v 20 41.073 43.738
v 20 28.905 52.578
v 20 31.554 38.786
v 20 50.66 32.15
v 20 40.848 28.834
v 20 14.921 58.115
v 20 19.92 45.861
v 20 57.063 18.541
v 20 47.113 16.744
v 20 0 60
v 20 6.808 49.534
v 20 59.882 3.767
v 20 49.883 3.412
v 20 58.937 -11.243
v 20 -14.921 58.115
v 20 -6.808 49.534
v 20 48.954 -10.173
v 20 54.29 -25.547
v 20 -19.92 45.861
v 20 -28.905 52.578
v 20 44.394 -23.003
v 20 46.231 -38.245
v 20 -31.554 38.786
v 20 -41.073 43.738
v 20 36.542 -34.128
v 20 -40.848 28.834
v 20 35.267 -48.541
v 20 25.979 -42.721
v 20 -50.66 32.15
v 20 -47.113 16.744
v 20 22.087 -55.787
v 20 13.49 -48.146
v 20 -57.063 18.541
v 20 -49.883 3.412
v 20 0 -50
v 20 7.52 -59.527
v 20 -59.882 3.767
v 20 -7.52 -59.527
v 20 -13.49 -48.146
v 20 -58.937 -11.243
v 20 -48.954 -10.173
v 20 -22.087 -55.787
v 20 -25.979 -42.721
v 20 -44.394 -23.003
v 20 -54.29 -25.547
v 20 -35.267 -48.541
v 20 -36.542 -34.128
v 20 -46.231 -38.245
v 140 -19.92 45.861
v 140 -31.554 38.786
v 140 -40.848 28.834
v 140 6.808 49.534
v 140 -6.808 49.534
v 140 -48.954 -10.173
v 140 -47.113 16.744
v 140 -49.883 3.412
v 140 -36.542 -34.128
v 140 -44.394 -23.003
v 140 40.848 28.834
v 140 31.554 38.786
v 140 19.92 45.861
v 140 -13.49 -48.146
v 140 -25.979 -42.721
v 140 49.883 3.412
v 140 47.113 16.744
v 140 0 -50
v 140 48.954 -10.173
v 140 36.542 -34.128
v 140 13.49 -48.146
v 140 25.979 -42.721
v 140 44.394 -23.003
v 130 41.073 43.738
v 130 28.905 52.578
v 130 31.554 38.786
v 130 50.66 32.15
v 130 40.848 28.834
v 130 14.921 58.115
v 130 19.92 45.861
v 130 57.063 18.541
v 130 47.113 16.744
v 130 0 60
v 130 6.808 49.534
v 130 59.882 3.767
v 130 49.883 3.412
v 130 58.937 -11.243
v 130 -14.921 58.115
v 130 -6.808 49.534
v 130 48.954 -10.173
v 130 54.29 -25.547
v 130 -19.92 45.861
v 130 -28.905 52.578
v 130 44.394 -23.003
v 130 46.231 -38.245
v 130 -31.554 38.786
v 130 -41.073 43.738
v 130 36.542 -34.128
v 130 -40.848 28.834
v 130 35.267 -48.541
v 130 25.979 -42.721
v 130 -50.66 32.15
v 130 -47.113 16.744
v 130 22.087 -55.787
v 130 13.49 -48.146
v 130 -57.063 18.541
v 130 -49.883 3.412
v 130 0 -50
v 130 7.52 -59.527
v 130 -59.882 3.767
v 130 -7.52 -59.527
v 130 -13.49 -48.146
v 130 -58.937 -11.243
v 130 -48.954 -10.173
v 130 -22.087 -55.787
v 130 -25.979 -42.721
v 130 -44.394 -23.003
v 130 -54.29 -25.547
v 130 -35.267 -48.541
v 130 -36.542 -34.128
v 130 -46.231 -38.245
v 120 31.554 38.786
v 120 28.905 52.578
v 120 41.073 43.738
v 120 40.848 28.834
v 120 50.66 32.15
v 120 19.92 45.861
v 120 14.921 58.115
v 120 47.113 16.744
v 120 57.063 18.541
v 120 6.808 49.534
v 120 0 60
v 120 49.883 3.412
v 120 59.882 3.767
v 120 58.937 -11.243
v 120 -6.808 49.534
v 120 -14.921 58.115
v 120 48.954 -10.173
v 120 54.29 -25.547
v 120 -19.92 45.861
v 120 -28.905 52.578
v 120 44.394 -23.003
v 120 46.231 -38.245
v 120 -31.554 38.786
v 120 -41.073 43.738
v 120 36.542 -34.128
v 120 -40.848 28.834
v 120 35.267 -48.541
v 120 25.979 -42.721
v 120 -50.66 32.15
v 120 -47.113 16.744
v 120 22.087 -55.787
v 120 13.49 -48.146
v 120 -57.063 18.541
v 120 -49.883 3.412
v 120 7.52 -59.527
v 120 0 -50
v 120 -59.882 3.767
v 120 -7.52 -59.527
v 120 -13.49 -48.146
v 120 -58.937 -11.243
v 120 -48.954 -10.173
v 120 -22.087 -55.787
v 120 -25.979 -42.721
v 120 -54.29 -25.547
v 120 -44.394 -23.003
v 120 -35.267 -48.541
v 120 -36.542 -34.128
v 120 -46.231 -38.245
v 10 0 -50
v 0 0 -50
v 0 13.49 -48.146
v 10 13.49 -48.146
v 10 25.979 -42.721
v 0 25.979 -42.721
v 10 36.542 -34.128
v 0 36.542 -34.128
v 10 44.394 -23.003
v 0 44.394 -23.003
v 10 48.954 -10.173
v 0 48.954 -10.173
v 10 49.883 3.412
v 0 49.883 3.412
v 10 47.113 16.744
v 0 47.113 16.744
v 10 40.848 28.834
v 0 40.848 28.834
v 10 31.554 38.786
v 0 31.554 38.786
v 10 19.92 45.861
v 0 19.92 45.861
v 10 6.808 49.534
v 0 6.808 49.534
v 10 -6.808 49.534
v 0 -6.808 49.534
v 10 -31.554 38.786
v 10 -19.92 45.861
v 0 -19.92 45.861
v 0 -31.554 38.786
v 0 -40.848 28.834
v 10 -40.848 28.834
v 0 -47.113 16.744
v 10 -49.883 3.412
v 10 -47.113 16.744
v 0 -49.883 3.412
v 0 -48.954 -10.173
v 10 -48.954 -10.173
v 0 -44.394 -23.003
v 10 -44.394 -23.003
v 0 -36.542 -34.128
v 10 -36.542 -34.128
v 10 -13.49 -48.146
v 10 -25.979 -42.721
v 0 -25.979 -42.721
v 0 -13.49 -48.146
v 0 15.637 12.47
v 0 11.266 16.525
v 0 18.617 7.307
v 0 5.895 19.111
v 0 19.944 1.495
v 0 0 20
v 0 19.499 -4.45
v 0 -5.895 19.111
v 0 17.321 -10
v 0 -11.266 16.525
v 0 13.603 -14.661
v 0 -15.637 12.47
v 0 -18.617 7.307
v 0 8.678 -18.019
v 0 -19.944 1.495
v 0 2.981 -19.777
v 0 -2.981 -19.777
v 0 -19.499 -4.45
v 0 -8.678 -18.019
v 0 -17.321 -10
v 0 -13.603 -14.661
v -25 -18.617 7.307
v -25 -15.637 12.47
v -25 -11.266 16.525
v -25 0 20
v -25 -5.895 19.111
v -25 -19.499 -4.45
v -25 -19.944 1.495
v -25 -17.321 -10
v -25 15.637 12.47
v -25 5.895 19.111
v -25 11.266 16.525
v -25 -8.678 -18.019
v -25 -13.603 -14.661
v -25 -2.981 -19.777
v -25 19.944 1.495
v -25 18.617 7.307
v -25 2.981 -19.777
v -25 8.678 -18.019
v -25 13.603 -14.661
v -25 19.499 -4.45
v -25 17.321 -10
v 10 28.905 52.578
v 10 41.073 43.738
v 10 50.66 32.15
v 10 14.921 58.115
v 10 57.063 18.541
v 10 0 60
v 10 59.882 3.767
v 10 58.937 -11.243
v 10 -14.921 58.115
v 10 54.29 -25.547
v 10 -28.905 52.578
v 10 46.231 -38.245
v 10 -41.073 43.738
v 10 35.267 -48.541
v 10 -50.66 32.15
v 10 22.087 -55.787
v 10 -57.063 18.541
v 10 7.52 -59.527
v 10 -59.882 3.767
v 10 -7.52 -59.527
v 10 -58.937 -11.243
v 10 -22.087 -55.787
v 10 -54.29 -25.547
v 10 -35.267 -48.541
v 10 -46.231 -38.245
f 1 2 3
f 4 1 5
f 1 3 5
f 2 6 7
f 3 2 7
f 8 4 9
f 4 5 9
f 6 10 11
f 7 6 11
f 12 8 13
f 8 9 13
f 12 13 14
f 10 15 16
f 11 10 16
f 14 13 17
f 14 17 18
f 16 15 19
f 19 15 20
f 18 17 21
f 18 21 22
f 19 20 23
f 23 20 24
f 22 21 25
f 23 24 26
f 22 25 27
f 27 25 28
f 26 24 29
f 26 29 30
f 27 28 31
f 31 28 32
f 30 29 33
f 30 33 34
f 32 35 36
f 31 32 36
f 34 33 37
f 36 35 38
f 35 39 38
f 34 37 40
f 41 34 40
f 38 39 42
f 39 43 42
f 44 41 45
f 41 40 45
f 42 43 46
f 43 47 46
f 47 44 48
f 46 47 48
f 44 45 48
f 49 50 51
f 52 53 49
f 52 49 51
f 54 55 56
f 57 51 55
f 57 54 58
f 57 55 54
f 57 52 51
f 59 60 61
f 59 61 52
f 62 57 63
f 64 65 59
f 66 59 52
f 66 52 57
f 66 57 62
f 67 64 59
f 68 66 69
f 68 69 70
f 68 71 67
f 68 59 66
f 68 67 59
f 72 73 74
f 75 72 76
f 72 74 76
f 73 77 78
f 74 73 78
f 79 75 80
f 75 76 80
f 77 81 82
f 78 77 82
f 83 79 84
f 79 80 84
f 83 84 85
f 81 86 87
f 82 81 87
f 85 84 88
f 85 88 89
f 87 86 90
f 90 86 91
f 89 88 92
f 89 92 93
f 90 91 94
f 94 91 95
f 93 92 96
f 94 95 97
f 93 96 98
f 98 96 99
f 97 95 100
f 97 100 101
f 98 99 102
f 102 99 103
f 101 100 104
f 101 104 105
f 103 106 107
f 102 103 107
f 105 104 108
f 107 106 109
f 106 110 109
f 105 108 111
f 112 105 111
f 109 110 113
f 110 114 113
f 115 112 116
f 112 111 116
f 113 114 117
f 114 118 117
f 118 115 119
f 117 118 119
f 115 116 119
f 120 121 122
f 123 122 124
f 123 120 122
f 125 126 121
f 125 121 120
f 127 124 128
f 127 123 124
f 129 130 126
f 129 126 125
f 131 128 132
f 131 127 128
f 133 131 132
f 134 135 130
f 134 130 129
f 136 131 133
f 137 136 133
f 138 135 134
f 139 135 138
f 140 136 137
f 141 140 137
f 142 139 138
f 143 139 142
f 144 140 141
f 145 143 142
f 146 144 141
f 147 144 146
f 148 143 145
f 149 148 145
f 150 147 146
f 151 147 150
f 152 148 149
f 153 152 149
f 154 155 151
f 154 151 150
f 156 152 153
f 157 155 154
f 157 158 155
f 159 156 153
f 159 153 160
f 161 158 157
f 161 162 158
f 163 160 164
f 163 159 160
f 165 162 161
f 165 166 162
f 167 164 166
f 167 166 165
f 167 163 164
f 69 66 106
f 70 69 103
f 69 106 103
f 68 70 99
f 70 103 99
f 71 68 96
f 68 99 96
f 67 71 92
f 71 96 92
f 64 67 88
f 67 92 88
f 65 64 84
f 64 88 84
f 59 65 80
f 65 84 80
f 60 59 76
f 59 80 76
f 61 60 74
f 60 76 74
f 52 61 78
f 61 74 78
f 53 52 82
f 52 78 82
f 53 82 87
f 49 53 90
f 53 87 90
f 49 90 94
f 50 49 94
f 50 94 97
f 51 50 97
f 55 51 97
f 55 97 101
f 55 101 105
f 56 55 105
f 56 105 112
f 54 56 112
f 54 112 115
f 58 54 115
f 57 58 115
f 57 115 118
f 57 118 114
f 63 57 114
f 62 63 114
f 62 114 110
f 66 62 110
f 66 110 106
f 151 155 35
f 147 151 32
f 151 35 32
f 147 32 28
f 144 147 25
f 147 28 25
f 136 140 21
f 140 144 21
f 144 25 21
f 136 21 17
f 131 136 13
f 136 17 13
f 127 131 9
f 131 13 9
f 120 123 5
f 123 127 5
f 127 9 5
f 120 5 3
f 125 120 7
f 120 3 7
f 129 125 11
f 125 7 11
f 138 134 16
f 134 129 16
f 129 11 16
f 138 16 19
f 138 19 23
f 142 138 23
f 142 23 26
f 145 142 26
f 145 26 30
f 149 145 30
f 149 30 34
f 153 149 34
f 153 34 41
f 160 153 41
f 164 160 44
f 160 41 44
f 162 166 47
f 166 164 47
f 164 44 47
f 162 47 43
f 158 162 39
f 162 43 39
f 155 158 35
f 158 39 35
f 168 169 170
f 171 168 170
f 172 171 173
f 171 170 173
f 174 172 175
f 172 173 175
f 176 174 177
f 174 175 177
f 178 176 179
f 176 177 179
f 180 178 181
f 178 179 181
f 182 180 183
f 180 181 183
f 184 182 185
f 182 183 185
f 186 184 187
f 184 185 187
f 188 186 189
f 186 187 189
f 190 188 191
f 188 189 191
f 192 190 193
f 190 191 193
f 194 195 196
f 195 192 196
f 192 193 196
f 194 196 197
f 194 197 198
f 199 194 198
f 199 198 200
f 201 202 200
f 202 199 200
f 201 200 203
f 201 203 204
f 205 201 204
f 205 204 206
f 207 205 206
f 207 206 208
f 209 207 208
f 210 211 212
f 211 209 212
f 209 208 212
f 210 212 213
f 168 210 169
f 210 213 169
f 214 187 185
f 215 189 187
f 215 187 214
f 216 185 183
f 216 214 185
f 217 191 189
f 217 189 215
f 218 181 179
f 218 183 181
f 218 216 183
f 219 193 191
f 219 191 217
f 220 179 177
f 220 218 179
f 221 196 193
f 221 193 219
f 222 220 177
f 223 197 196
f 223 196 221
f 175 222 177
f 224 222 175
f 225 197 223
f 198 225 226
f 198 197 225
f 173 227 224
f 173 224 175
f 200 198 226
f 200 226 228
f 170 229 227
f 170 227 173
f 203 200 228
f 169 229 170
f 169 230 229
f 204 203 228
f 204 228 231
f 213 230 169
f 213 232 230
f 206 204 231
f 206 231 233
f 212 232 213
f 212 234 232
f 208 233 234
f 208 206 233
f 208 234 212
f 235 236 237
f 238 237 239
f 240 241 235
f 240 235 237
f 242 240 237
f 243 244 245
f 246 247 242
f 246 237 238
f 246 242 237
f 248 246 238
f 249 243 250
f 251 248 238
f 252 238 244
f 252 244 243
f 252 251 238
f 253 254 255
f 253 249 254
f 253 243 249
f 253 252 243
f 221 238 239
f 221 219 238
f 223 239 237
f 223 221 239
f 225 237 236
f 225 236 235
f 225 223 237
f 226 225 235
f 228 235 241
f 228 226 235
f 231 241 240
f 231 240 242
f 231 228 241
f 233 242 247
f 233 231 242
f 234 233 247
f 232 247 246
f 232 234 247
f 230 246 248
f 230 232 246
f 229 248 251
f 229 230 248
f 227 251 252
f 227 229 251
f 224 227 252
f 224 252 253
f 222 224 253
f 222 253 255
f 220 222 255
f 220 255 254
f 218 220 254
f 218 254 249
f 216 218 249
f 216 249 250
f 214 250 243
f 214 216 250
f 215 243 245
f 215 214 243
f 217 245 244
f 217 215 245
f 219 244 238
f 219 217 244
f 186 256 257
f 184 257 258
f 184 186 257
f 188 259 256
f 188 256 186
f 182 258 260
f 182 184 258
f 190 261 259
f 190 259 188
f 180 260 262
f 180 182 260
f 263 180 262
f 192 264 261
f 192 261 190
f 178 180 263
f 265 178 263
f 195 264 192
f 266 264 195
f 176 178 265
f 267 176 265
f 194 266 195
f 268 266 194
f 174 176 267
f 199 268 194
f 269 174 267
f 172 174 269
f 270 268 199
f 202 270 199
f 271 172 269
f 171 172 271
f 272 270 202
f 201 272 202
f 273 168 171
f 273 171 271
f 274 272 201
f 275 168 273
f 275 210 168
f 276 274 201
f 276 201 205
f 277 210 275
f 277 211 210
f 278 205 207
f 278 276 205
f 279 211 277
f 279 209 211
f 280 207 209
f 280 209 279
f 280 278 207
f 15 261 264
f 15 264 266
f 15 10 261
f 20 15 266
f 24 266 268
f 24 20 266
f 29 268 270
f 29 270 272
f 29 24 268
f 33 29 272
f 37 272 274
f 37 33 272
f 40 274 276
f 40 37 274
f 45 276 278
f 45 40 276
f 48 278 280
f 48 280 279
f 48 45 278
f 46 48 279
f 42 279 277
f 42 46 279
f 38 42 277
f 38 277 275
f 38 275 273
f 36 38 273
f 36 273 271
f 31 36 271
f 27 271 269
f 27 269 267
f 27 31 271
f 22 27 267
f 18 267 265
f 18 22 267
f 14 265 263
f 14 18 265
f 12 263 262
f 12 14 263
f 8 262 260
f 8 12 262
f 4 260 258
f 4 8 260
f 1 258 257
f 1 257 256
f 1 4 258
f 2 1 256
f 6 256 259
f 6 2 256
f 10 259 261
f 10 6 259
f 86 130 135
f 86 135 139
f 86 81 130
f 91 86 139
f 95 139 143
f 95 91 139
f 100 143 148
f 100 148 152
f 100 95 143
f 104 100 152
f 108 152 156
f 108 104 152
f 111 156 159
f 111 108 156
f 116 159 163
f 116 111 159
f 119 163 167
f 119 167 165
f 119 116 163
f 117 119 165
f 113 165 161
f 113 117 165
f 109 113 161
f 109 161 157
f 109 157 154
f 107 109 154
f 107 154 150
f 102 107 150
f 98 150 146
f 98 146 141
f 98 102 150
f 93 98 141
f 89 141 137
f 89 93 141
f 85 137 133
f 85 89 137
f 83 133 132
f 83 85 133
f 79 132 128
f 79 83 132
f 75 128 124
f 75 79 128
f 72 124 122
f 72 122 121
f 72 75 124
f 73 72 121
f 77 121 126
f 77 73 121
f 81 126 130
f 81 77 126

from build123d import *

# Parameters (mm, degrees)
SKETCH1_R               = 50
BOSS_EXTRUDE1_DEPTH     = 140
SKETCH2_W               = 10
SKETCH2_H               = 60
BOSS_EXTRUDE2_START     = 100
SKETCH3_R               = 50
BOSS_EXTRUDE2_DEPTH     = 100
SKETCH4_R               = 169.268161275
BOSS_EXTRUDE3_DEPTH     = 10
FILLET2_R               = 50
CUT_EXTRUDE1_DEPTH      = 278.314660346
CUT_EXTRUDE1_DEPTH_BACK = 278.314660346
SKETCH5_W               = 221.299470988
SKETCH5_H               = 358.524470465


with BuildPart() as part:
    # Sketch1 → Boss-Extrude1 (new body)
    with BuildSketch(Plane(origin=(0, 0, 0), x_dir=(0, 0, -1), z_dir=(1, 0, 0))):
        Circle(SKETCH1_R)
    extrude(amount=BOSS_EXTRUDE1_DEPTH)

    # Sketch2 → Revolve1 (revolve)
    with BuildSketch(Plane(origin=(0, 0, 0), x_dir=(1, 0, 0), z_dir=(0, 1, 0)), mode=Mode.PRIVATE) as revolve1_sk:
        with Locations((15, 30)):
            Rectangle(SKETCH2_W, SKETCH2_H)
        with Locations((125, 30)):
            Rectangle(SKETCH2_W, SKETCH2_H)
    revolve(revolve1_sk.sketch.rotate(Axis((0, 0, 0), (1, 0, 0)), 180), axis=Axis((0, 0, 0), (1, 0, 0)))

    # Sketch3 → Boss-Extrude2 (add)
    with BuildSketch(Plane.ZY.offset(BOSS_EXTRUDE2_START)):
        Circle(SKETCH3_R)
    extrude(amount=-BOSS_EXTRUDE2_DEPTH)

    # Sketch4 → Boss-Extrude3 (add)
    with BuildSketch(Plane.ZY.offset(100)):
        Circle(SKETCH4_R)
    extrude(amount=BOSS_EXTRUDE3_DEPTH)

    # Fillet2
    fillet2_edges = [part.edges().sort_by_distance(p)[0] for p in [
        (-100, 0, -50),
    ]]
    fillet(fillet2_edges, radius=FILLET2_R)

    # Sketch5 → Cut-Extrude1 (cut, two sides: drawn at the far end of the back side and taken through both)
    with BuildSketch(Plane.XY.offset(-CUT_EXTRUDE1_DEPTH_BACK)):
        with Locations((-135.649735494, -5.556646105)):
            Rectangle(SKETCH5_W, SKETCH5_H)
    extrude(amount=CUT_EXTRUDE1_DEPTH + CUT_EXTRUDE1_DEPTH_BACK, mode=Mode.SUBTRACT)

    # Sketch6 → Cut-Revolve1 (revolve, cut)
    with BuildSketch(Plane(origin=(0, 0, 0), x_dir=(1, 0, 0), z_dir=(0, 1, 0)), mode=Mode.PRIVATE) as cut_revolve1_sk:
        Polygon((-37.123590864, 20), (0, 20), (0, 63.419467726), (-45.130639874, 53.302044746), align=None)
    revolve(cut_revolve1_sk.sketch.rotate(Axis((-42.77009101, 0, 0), (1, 0, 0)), 180), axis=Axis((-42.77009101, 0, 0), (1, 0, 0)), mode=Mode.SUBTRACT)


solid = part.part
